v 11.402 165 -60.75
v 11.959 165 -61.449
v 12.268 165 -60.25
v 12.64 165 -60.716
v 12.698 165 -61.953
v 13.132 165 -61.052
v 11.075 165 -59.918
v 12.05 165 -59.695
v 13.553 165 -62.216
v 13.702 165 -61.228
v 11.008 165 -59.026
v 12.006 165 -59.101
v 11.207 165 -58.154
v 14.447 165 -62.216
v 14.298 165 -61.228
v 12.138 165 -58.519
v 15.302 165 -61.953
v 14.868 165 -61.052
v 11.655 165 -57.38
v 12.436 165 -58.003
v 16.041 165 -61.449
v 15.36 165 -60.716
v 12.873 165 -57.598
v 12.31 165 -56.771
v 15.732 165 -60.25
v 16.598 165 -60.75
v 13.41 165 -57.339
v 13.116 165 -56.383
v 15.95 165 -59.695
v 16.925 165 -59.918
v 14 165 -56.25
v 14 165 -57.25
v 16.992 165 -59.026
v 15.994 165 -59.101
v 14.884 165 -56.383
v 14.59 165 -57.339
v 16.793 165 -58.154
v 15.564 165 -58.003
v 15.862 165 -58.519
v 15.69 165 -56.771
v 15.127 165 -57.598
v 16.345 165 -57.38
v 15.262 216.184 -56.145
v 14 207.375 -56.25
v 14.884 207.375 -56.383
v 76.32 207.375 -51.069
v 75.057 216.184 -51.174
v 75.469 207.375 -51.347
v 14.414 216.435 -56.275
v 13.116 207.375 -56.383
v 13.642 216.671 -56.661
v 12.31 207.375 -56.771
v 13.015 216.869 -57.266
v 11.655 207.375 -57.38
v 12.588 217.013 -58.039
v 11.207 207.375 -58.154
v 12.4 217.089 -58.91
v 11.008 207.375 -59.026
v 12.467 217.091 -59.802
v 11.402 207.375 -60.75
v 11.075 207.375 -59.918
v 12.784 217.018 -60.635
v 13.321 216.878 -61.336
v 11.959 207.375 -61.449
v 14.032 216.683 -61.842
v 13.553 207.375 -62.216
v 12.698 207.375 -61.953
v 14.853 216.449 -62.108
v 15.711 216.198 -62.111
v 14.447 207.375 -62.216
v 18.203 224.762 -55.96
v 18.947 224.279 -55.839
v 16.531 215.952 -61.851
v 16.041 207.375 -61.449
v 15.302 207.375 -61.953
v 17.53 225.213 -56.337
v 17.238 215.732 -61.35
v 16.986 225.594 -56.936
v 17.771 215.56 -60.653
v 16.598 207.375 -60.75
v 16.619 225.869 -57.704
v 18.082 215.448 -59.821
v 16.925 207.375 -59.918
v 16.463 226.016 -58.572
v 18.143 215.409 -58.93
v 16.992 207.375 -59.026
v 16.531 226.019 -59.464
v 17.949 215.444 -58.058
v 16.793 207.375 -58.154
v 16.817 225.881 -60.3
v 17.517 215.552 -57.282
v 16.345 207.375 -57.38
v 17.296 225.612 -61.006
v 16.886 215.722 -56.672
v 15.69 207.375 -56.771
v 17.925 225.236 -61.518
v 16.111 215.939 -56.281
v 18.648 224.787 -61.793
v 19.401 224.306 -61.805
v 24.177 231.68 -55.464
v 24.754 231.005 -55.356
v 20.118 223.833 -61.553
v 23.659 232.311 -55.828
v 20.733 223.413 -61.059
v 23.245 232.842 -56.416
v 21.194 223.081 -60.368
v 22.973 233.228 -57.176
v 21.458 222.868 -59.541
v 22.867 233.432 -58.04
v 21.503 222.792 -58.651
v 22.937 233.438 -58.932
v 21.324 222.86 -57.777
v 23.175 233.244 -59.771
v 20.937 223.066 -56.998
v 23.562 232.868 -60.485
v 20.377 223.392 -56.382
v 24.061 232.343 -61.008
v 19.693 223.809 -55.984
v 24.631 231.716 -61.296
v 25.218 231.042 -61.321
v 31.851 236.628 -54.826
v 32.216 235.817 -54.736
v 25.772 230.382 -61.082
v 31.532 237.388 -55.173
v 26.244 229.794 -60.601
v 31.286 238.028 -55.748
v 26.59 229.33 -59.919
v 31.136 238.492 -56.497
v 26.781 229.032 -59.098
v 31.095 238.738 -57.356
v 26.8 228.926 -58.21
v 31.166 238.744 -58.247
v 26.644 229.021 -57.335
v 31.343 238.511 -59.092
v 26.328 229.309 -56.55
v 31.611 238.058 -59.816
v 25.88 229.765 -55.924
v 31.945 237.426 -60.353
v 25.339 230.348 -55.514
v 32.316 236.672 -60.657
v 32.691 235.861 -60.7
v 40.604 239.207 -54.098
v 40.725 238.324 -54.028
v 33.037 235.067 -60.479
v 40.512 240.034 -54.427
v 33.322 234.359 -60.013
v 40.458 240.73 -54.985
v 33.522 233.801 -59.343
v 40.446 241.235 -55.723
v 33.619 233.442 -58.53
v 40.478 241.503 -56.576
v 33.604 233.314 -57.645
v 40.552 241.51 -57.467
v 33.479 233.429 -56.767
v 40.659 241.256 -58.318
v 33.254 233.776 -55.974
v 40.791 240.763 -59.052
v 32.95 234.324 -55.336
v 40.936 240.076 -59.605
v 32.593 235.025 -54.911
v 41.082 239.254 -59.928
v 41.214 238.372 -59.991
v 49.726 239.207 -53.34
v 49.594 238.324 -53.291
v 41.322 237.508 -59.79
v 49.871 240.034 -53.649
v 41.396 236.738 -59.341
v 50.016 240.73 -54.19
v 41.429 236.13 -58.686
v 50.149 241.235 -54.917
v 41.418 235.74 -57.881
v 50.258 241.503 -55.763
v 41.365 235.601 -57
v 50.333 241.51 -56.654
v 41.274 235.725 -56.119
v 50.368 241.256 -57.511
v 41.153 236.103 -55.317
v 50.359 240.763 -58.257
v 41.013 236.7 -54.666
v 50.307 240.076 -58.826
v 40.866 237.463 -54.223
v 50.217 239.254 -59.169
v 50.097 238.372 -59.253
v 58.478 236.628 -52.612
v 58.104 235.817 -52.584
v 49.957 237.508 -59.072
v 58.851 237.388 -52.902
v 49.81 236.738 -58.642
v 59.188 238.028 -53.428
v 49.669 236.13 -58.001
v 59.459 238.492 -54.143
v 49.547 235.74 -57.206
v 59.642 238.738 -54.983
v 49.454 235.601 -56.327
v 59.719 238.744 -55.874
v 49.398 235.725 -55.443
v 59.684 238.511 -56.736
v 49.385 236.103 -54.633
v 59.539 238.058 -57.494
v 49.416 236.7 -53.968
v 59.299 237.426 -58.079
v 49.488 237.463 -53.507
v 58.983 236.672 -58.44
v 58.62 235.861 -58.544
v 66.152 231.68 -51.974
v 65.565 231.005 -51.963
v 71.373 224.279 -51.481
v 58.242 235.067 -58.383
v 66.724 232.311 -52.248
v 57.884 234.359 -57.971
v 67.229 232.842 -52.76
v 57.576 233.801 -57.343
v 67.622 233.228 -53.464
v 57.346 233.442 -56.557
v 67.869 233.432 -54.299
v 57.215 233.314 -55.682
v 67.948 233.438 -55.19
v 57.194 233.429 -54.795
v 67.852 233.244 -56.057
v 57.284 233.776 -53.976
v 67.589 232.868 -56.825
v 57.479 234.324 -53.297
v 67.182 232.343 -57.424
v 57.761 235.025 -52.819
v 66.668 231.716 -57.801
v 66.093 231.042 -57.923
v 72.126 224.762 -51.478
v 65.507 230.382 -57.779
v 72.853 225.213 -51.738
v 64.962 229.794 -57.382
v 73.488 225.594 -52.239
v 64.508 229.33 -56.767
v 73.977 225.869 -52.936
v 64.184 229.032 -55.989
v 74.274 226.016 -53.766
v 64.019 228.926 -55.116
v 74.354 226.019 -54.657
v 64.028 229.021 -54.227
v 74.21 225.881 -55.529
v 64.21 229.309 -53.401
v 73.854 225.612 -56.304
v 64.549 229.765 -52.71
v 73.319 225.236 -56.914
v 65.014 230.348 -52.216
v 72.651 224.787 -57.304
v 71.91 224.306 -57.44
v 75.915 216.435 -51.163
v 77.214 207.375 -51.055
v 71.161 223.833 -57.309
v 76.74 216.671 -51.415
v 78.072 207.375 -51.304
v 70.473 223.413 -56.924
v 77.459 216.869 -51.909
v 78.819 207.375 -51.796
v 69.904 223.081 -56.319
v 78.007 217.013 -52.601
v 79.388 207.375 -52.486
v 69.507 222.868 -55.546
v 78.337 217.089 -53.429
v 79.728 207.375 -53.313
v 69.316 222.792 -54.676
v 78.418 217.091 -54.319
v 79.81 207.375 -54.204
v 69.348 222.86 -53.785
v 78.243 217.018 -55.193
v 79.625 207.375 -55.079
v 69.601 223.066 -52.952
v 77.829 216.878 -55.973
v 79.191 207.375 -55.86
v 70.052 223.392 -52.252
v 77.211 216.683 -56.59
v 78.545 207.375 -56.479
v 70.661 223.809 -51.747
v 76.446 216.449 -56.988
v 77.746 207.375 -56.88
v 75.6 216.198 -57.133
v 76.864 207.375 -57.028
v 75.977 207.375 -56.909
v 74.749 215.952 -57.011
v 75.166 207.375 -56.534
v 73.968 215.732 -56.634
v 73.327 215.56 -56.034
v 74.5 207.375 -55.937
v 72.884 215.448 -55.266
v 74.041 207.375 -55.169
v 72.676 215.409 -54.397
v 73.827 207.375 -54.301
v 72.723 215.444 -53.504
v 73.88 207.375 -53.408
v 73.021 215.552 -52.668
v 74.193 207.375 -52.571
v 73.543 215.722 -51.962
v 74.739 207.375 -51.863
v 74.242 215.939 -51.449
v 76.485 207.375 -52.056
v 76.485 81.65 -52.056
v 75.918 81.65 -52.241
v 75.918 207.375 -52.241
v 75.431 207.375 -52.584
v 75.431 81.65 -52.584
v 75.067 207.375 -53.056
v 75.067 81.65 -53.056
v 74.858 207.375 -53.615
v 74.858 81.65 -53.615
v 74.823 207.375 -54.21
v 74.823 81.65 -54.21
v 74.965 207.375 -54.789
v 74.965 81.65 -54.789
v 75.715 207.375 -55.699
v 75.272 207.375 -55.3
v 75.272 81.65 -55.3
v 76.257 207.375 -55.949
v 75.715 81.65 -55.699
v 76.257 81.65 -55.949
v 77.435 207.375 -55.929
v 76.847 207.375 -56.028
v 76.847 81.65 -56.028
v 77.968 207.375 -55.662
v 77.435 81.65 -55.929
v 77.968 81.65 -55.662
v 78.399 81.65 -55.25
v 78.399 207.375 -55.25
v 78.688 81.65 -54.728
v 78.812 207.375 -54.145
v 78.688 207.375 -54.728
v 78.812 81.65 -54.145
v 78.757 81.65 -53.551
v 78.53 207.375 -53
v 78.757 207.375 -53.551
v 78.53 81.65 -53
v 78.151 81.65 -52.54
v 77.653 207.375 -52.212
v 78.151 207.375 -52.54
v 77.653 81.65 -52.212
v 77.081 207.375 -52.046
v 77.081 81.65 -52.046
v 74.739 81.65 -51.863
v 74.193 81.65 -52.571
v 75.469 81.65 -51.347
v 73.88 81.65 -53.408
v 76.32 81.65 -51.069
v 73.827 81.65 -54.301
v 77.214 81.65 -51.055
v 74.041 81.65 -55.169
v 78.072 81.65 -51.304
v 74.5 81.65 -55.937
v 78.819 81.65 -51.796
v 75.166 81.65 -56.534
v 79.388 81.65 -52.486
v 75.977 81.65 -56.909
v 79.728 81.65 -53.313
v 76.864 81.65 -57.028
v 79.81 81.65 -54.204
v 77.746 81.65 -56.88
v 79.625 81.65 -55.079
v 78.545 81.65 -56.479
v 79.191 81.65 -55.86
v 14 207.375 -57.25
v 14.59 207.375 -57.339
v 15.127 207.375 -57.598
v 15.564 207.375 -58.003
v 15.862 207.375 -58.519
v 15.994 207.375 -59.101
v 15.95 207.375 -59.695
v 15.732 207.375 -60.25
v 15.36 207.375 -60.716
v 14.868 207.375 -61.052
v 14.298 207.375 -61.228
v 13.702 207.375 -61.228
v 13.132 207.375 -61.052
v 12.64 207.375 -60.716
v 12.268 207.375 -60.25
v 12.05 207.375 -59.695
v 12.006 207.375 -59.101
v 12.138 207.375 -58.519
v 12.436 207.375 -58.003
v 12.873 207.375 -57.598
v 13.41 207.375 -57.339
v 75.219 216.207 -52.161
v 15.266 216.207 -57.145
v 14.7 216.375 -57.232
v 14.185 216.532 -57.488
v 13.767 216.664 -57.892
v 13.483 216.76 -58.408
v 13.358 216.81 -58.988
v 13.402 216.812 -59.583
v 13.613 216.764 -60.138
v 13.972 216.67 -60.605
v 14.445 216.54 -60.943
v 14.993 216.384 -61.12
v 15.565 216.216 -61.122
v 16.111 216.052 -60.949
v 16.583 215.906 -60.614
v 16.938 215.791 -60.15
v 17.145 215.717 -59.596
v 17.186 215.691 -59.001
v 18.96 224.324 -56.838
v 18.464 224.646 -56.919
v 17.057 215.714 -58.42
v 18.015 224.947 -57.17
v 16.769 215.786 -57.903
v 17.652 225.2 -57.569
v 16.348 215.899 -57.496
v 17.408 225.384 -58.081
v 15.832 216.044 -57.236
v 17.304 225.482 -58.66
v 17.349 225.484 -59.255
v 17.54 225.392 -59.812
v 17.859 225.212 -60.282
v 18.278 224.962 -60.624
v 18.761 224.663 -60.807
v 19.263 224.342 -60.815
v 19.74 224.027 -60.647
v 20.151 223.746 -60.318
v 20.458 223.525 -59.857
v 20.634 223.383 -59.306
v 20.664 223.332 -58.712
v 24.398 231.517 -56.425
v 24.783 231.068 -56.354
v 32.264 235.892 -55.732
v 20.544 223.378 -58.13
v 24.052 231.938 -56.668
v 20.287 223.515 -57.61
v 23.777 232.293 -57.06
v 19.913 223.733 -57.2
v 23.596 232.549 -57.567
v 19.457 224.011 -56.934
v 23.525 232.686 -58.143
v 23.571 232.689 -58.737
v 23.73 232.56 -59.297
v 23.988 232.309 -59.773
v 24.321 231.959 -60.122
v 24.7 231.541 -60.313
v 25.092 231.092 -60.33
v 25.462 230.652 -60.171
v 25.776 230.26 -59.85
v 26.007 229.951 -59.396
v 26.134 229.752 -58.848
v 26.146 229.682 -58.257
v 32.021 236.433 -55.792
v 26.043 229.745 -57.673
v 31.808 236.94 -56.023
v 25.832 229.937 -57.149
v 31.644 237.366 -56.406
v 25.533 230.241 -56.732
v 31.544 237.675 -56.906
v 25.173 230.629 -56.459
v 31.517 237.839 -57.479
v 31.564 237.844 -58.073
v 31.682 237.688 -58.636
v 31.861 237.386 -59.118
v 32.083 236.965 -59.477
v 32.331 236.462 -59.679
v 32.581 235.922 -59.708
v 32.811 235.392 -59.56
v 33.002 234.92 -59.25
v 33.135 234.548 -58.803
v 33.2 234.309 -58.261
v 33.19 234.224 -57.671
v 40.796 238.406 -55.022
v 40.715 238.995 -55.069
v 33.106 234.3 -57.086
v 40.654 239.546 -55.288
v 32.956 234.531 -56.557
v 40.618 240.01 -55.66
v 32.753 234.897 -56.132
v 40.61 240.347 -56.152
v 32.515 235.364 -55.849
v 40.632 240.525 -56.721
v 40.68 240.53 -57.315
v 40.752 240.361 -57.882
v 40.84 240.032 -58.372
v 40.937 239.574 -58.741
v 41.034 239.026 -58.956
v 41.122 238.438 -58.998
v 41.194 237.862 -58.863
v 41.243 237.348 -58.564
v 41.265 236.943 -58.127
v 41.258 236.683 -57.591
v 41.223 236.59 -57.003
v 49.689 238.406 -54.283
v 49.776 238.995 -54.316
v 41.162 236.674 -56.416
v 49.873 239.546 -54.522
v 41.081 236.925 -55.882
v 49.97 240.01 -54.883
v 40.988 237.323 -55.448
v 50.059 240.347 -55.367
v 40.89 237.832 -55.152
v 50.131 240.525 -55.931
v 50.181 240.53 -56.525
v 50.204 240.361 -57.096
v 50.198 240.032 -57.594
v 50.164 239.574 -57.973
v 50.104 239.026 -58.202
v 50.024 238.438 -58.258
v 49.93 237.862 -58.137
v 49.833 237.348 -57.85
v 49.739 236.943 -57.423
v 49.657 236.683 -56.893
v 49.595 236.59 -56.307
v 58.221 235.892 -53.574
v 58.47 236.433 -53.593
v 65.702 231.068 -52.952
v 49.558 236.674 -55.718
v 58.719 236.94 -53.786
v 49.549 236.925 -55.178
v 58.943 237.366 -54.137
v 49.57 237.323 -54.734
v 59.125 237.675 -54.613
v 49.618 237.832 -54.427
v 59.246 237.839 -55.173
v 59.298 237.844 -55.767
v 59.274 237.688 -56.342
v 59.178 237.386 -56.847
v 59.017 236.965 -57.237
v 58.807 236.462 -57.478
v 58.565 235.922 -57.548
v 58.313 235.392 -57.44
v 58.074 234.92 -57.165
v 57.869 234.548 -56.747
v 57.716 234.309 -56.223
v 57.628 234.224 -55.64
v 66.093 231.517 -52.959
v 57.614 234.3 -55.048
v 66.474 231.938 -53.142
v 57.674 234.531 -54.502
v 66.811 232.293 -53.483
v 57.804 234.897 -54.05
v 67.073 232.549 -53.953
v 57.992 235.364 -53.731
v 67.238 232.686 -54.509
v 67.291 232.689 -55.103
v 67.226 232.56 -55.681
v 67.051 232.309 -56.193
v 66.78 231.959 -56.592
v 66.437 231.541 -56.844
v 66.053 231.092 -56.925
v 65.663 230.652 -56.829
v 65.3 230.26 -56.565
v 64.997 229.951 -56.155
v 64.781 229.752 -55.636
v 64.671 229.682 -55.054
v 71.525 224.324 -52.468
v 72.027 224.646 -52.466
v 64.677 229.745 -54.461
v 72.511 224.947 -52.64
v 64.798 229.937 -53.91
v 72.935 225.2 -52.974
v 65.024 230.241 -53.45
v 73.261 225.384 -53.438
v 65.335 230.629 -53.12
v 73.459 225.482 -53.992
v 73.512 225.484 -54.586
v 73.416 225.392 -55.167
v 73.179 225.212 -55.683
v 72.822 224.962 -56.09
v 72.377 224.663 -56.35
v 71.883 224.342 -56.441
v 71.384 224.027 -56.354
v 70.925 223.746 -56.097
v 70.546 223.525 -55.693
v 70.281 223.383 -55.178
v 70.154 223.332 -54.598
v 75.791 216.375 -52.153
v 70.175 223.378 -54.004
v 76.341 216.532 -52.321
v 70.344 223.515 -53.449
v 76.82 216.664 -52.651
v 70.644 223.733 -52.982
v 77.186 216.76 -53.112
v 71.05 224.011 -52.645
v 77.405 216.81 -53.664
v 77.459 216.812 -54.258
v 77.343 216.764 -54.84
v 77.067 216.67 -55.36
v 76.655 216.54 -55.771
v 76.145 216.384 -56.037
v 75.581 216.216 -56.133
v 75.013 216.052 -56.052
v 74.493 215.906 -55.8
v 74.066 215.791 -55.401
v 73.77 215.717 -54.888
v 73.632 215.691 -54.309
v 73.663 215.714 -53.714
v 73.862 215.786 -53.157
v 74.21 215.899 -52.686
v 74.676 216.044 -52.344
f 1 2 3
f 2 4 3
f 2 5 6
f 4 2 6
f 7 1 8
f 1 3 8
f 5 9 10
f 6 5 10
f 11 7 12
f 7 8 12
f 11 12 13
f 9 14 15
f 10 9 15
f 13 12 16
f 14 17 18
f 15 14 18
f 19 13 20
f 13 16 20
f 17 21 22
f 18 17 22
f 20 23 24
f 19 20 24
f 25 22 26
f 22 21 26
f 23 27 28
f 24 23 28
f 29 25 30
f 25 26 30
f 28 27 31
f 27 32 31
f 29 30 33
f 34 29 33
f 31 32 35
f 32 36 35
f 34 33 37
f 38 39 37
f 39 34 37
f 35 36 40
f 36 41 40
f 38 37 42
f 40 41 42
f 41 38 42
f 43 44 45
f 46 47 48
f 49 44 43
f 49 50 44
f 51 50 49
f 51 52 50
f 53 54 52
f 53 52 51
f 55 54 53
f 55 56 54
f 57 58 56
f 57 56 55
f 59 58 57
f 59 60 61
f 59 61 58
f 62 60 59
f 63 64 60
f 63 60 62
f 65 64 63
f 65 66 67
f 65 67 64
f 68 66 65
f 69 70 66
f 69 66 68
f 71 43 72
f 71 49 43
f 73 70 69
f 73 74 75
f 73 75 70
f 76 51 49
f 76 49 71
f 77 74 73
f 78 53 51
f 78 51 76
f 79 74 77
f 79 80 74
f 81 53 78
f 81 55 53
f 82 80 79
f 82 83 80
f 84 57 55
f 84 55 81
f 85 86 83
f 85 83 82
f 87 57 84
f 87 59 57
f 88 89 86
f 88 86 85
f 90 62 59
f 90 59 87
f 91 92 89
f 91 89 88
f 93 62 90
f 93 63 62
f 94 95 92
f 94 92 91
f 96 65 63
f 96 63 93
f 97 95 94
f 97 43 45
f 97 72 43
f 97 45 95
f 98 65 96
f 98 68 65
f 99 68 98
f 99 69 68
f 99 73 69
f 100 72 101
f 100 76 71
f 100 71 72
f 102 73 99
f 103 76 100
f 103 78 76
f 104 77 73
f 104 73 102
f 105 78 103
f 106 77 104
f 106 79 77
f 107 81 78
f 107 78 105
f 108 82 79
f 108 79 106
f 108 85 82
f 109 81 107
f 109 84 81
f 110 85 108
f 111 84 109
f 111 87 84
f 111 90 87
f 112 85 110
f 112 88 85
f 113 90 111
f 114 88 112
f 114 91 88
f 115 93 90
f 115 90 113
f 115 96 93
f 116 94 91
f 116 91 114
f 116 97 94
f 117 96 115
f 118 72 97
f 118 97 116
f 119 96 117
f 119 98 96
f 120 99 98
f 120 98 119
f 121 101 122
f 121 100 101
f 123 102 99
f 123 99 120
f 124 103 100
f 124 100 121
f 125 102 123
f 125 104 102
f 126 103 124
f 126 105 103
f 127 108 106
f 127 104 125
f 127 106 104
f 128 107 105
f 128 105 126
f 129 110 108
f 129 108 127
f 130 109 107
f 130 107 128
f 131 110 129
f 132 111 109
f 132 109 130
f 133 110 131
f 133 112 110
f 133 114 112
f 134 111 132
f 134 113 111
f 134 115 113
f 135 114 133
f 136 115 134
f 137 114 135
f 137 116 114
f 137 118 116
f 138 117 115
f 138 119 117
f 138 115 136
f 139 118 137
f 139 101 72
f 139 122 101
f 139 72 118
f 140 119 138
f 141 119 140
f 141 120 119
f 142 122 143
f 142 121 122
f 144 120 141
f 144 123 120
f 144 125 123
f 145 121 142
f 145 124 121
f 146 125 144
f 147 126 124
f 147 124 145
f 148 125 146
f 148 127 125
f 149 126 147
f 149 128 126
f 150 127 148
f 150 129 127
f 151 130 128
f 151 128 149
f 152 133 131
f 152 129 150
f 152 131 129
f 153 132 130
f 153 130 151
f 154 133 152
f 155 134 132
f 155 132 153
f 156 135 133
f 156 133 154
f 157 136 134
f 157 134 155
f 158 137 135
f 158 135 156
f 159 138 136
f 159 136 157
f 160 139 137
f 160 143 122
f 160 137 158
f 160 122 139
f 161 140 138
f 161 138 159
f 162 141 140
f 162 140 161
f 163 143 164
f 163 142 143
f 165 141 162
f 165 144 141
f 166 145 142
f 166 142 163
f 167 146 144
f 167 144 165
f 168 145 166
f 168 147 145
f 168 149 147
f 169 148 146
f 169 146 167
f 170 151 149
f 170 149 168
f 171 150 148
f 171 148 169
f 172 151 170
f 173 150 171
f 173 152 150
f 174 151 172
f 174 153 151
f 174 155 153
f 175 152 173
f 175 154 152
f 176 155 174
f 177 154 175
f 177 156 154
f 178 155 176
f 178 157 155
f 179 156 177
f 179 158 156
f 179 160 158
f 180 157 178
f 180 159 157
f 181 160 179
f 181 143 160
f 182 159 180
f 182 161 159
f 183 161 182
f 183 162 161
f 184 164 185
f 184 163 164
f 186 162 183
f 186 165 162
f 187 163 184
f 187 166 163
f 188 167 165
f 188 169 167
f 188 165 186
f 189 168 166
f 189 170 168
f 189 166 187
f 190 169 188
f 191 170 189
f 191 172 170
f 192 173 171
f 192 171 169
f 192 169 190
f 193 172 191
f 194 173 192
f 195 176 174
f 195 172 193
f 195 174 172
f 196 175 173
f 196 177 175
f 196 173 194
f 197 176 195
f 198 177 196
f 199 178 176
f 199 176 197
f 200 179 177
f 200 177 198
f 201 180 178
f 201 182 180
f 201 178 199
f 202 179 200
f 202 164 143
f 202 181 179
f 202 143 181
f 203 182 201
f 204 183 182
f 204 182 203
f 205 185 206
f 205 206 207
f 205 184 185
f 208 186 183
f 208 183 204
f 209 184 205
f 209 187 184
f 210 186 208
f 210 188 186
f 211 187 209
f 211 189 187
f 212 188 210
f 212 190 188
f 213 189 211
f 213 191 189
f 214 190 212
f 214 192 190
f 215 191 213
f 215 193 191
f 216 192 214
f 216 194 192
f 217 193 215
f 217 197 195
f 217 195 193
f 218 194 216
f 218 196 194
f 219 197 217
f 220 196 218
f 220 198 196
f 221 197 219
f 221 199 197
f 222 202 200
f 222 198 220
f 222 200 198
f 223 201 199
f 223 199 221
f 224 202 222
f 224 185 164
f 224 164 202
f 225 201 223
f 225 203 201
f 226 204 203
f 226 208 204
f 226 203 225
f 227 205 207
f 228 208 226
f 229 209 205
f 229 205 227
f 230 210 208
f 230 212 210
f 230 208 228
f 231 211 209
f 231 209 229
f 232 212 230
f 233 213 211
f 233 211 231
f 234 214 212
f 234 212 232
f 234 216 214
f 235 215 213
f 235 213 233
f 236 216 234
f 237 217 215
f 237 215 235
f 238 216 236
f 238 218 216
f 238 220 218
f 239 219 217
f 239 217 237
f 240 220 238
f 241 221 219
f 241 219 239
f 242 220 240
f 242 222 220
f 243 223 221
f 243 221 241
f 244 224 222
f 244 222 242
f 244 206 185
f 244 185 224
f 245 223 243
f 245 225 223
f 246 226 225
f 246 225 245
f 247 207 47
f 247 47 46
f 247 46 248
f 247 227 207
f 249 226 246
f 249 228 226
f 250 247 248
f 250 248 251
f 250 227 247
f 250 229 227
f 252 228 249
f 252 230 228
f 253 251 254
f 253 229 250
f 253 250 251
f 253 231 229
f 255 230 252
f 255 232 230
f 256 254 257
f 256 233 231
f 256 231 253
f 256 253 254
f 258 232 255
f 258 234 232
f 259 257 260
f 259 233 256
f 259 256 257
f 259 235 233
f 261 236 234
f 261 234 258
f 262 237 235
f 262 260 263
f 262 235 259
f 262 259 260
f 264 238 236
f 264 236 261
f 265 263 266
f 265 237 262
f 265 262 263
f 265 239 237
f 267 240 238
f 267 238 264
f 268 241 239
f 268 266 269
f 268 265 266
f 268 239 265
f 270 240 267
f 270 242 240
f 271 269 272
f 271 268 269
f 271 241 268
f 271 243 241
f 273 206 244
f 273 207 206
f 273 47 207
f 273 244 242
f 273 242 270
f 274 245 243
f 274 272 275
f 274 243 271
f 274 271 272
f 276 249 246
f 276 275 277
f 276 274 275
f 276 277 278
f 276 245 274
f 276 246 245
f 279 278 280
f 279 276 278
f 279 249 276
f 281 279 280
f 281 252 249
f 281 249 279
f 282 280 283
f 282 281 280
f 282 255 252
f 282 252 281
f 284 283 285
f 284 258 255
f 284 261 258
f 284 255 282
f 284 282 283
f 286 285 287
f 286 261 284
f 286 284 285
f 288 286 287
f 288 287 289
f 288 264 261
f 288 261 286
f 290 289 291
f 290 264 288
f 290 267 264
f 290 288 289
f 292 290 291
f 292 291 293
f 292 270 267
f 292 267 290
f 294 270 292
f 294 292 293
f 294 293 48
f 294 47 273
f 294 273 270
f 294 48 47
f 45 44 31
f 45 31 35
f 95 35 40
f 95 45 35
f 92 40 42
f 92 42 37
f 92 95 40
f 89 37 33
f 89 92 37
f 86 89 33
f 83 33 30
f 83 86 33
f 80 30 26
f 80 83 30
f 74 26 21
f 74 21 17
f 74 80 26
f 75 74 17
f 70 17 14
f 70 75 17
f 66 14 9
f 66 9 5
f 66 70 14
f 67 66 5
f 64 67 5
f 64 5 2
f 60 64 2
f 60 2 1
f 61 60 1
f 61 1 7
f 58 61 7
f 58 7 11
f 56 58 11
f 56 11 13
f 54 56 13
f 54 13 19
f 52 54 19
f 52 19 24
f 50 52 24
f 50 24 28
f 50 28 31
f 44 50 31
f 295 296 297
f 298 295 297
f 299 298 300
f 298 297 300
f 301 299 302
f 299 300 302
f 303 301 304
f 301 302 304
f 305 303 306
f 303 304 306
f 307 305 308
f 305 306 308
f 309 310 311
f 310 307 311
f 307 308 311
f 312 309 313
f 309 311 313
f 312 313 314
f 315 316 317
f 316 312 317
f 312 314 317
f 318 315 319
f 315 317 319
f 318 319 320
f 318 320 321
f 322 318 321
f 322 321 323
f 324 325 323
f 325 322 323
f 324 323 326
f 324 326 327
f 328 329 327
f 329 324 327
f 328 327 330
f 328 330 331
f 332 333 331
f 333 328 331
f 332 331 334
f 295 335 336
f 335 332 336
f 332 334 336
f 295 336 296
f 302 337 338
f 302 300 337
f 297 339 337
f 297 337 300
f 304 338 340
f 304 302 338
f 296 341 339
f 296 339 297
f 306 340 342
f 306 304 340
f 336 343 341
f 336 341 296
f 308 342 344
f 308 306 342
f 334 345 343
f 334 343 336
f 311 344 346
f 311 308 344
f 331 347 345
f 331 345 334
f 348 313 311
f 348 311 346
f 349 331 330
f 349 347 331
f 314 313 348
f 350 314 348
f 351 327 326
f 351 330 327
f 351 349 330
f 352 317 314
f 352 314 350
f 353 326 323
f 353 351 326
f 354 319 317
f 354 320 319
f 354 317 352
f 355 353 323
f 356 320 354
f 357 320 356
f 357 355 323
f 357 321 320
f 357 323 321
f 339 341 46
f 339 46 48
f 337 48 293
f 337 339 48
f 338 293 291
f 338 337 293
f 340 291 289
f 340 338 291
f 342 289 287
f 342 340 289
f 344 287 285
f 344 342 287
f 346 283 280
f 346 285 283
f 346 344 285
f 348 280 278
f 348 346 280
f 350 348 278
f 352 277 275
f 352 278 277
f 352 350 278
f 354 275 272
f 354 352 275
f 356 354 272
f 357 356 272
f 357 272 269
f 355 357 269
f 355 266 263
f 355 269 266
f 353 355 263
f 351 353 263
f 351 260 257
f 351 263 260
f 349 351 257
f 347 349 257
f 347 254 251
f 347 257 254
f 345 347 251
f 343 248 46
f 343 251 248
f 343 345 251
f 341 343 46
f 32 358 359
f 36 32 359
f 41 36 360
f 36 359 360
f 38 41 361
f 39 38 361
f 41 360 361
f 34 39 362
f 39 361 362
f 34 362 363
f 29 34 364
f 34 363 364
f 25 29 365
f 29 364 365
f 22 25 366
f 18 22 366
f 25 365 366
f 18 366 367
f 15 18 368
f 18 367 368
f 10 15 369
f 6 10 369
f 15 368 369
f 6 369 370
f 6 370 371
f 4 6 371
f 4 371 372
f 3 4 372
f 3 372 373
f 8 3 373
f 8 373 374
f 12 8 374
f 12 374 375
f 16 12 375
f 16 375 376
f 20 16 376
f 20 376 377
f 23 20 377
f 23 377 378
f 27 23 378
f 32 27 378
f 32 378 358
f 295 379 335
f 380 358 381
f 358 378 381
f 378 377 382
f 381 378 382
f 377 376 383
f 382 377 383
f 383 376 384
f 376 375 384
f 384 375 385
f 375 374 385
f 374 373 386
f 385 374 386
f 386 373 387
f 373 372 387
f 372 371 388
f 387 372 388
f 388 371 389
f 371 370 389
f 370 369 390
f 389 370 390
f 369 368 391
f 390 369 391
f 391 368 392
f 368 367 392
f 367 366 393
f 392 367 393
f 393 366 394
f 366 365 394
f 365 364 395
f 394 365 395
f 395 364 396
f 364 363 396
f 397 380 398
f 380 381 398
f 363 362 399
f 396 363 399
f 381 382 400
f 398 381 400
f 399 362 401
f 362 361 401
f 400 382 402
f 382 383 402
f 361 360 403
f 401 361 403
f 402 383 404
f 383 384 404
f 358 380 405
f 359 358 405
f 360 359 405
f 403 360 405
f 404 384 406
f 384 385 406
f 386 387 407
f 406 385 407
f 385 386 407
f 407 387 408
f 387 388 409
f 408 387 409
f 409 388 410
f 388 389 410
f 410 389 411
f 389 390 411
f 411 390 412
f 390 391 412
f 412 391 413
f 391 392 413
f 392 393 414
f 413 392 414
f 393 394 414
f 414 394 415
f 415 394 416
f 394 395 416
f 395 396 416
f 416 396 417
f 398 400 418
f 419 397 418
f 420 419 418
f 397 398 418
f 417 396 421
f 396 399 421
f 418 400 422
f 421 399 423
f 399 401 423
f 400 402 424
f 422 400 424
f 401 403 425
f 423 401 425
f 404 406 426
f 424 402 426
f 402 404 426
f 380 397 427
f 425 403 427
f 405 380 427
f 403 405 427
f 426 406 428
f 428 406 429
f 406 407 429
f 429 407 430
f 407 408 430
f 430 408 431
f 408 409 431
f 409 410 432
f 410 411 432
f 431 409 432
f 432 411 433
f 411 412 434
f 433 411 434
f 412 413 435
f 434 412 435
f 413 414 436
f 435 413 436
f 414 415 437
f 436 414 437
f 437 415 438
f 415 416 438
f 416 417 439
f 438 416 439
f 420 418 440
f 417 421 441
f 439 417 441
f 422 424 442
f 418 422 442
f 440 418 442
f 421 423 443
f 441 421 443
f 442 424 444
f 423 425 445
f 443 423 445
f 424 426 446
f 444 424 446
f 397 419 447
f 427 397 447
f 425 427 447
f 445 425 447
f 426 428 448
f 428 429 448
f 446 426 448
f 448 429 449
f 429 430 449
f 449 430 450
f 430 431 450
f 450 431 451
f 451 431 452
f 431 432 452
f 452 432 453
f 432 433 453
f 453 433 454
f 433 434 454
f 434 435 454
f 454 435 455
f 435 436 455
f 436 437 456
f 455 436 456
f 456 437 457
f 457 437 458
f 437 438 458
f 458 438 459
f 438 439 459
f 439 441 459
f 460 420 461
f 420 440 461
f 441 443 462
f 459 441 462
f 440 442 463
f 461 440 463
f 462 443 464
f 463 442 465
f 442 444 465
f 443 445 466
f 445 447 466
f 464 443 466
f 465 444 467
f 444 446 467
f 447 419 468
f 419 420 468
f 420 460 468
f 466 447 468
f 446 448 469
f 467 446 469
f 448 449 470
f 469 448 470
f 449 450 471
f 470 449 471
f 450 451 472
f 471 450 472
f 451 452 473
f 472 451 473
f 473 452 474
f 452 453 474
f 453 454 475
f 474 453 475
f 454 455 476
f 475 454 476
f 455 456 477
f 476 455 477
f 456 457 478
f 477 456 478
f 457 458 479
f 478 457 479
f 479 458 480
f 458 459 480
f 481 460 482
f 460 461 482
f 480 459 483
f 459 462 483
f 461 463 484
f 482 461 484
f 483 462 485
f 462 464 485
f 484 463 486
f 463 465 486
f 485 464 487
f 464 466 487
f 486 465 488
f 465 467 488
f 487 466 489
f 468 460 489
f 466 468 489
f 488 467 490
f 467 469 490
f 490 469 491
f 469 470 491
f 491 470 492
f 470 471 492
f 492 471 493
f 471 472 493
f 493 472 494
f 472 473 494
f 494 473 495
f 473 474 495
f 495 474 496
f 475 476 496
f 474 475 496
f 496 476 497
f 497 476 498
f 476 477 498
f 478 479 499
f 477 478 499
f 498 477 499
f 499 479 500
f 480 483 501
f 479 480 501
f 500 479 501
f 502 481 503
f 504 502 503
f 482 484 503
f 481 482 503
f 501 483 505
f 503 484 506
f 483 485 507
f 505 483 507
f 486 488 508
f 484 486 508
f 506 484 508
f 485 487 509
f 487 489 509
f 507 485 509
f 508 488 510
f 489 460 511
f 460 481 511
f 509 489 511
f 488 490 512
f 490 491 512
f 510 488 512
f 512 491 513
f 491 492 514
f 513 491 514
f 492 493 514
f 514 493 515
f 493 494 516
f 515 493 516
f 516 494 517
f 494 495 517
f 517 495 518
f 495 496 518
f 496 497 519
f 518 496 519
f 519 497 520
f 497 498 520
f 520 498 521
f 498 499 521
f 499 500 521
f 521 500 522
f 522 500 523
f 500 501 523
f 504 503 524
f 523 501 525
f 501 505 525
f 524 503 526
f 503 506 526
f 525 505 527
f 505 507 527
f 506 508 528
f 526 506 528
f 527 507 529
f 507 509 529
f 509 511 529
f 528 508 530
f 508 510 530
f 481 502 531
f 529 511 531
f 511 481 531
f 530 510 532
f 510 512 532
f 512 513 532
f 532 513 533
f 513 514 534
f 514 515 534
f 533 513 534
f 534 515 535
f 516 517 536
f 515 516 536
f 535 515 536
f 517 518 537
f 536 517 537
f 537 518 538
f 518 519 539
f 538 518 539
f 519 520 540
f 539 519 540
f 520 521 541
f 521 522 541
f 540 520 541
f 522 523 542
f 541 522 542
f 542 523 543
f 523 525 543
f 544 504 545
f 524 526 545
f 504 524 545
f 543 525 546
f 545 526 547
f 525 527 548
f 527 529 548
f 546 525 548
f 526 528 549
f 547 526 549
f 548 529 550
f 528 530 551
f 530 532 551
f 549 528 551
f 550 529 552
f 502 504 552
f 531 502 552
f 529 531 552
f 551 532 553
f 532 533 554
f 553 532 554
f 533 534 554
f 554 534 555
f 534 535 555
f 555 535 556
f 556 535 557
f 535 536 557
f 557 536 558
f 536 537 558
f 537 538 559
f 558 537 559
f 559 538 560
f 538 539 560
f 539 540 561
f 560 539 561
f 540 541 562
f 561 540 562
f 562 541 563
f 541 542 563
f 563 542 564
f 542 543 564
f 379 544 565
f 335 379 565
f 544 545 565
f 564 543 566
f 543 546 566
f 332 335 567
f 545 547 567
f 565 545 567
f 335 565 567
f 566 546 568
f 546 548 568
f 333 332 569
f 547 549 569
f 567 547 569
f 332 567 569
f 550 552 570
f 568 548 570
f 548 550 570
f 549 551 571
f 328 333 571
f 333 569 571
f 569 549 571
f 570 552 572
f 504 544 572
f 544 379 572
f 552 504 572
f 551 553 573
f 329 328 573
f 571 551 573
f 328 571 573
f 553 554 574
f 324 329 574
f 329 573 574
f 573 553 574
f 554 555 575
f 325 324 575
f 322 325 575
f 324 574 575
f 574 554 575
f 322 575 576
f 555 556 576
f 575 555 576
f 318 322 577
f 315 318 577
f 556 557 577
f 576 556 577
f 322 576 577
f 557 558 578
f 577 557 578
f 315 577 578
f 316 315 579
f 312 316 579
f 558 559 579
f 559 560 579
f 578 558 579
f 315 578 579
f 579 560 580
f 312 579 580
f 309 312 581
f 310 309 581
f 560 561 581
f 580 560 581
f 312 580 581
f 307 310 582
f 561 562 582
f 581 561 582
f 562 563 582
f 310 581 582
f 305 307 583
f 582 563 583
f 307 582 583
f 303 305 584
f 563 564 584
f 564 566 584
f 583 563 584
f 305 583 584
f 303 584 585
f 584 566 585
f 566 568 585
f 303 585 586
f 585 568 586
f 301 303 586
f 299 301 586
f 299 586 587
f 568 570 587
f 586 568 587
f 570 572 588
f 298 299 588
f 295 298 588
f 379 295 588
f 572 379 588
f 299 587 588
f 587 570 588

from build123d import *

# Parameters (mm, degrees)
BALAYAGE_MINCE1_PROFILE_R   = 3
BALAYAGE_MINCE1_PROFILE_R_2 = 2


with BuildPart() as part:
    # Balayage-Mince1: sweep along a curve in space
    with BuildLine() as balayage_mince1_path:
        Line((14, 165, -59.25), (14, 207.375, -59.25))
        ThreePointArc((14, 207.375, -59.25), (45.407462351, 238.890799577, -56.639074556), (76.814924701, 207.375, -54.028149113))
        Line((76.814924701, 207.375, -54.028149113), (76.814924701, 81.65, -54.028149113))
    # Balayage-Mince1 profile (on start of the path) → Balayage-Mince1 (sweep)
    with BuildSketch(Plane(origin=(14, 165, -59.25), x_dir=(0, 0, 1), z_dir=(0, 1, 0))):
        Circle(BALAYAGE_MINCE1_PROFILE_R)
        Circle(BALAYAGE_MINCE1_PROFILE_R_2, mode=Mode.SUBTRACT)
    sweep(path=balayage_mince1_path.line)


solid = part.part
